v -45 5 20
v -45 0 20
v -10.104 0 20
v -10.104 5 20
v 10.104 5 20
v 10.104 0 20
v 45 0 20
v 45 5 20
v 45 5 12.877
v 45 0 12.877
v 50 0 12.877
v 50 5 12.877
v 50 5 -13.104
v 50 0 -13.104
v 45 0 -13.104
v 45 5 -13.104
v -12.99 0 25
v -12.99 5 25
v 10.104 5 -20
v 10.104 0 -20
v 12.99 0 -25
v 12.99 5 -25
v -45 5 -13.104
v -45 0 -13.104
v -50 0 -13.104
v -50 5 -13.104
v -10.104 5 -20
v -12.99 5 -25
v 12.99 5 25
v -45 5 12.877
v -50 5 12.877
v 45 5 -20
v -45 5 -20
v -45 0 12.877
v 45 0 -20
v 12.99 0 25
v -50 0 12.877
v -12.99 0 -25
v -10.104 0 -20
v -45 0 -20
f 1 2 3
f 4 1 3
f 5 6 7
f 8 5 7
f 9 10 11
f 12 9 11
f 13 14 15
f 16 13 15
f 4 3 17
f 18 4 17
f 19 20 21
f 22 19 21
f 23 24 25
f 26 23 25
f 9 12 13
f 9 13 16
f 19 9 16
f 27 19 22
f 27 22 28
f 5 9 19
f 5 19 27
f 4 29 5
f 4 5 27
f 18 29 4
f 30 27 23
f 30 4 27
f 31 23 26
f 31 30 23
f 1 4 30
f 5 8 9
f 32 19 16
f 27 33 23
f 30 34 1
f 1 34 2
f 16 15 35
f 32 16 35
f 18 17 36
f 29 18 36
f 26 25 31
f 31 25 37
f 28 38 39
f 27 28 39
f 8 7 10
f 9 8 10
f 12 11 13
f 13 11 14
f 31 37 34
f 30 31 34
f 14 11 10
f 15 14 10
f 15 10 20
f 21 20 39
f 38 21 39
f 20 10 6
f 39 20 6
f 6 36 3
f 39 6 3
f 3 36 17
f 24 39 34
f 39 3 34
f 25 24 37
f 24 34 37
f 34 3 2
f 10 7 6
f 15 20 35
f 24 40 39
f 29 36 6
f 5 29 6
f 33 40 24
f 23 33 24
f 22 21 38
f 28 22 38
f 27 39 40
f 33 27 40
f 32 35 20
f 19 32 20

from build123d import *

# Parameters (mm, degrees)
BOSS_EXTRUDE1_DEPTH = 5


with BuildPart() as part:
    # Sketch2 → Boss-Extrude1 (new body)
    with BuildSketch(Plane(origin=(0, 0, 0), x_dir=(-1, 0, 0), z_dir=(0, 1, 0))):
        Polygon((45, 20), (10.103629711, 20), (12.990381057, 25), (-12.990381057, 25), (-10.103629711, 20), (-45, 20), (-45, 12.876959441), (-50, 12.876959441), (-50, -13.103802672), (-45, -13.103802672), (-45, -20), (-10.103629711, -20), (-12.990381057, -25), (12.990381057, -25), (10.103629711, -20), (45, -20), (45, -13.103802672), (50, -13.103802672), (50, 12.876959441), (45, 12.876959441), align=None)
    extrude(amount=BOSS_EXTRUDE1_DEPTH)


solid = part.part
